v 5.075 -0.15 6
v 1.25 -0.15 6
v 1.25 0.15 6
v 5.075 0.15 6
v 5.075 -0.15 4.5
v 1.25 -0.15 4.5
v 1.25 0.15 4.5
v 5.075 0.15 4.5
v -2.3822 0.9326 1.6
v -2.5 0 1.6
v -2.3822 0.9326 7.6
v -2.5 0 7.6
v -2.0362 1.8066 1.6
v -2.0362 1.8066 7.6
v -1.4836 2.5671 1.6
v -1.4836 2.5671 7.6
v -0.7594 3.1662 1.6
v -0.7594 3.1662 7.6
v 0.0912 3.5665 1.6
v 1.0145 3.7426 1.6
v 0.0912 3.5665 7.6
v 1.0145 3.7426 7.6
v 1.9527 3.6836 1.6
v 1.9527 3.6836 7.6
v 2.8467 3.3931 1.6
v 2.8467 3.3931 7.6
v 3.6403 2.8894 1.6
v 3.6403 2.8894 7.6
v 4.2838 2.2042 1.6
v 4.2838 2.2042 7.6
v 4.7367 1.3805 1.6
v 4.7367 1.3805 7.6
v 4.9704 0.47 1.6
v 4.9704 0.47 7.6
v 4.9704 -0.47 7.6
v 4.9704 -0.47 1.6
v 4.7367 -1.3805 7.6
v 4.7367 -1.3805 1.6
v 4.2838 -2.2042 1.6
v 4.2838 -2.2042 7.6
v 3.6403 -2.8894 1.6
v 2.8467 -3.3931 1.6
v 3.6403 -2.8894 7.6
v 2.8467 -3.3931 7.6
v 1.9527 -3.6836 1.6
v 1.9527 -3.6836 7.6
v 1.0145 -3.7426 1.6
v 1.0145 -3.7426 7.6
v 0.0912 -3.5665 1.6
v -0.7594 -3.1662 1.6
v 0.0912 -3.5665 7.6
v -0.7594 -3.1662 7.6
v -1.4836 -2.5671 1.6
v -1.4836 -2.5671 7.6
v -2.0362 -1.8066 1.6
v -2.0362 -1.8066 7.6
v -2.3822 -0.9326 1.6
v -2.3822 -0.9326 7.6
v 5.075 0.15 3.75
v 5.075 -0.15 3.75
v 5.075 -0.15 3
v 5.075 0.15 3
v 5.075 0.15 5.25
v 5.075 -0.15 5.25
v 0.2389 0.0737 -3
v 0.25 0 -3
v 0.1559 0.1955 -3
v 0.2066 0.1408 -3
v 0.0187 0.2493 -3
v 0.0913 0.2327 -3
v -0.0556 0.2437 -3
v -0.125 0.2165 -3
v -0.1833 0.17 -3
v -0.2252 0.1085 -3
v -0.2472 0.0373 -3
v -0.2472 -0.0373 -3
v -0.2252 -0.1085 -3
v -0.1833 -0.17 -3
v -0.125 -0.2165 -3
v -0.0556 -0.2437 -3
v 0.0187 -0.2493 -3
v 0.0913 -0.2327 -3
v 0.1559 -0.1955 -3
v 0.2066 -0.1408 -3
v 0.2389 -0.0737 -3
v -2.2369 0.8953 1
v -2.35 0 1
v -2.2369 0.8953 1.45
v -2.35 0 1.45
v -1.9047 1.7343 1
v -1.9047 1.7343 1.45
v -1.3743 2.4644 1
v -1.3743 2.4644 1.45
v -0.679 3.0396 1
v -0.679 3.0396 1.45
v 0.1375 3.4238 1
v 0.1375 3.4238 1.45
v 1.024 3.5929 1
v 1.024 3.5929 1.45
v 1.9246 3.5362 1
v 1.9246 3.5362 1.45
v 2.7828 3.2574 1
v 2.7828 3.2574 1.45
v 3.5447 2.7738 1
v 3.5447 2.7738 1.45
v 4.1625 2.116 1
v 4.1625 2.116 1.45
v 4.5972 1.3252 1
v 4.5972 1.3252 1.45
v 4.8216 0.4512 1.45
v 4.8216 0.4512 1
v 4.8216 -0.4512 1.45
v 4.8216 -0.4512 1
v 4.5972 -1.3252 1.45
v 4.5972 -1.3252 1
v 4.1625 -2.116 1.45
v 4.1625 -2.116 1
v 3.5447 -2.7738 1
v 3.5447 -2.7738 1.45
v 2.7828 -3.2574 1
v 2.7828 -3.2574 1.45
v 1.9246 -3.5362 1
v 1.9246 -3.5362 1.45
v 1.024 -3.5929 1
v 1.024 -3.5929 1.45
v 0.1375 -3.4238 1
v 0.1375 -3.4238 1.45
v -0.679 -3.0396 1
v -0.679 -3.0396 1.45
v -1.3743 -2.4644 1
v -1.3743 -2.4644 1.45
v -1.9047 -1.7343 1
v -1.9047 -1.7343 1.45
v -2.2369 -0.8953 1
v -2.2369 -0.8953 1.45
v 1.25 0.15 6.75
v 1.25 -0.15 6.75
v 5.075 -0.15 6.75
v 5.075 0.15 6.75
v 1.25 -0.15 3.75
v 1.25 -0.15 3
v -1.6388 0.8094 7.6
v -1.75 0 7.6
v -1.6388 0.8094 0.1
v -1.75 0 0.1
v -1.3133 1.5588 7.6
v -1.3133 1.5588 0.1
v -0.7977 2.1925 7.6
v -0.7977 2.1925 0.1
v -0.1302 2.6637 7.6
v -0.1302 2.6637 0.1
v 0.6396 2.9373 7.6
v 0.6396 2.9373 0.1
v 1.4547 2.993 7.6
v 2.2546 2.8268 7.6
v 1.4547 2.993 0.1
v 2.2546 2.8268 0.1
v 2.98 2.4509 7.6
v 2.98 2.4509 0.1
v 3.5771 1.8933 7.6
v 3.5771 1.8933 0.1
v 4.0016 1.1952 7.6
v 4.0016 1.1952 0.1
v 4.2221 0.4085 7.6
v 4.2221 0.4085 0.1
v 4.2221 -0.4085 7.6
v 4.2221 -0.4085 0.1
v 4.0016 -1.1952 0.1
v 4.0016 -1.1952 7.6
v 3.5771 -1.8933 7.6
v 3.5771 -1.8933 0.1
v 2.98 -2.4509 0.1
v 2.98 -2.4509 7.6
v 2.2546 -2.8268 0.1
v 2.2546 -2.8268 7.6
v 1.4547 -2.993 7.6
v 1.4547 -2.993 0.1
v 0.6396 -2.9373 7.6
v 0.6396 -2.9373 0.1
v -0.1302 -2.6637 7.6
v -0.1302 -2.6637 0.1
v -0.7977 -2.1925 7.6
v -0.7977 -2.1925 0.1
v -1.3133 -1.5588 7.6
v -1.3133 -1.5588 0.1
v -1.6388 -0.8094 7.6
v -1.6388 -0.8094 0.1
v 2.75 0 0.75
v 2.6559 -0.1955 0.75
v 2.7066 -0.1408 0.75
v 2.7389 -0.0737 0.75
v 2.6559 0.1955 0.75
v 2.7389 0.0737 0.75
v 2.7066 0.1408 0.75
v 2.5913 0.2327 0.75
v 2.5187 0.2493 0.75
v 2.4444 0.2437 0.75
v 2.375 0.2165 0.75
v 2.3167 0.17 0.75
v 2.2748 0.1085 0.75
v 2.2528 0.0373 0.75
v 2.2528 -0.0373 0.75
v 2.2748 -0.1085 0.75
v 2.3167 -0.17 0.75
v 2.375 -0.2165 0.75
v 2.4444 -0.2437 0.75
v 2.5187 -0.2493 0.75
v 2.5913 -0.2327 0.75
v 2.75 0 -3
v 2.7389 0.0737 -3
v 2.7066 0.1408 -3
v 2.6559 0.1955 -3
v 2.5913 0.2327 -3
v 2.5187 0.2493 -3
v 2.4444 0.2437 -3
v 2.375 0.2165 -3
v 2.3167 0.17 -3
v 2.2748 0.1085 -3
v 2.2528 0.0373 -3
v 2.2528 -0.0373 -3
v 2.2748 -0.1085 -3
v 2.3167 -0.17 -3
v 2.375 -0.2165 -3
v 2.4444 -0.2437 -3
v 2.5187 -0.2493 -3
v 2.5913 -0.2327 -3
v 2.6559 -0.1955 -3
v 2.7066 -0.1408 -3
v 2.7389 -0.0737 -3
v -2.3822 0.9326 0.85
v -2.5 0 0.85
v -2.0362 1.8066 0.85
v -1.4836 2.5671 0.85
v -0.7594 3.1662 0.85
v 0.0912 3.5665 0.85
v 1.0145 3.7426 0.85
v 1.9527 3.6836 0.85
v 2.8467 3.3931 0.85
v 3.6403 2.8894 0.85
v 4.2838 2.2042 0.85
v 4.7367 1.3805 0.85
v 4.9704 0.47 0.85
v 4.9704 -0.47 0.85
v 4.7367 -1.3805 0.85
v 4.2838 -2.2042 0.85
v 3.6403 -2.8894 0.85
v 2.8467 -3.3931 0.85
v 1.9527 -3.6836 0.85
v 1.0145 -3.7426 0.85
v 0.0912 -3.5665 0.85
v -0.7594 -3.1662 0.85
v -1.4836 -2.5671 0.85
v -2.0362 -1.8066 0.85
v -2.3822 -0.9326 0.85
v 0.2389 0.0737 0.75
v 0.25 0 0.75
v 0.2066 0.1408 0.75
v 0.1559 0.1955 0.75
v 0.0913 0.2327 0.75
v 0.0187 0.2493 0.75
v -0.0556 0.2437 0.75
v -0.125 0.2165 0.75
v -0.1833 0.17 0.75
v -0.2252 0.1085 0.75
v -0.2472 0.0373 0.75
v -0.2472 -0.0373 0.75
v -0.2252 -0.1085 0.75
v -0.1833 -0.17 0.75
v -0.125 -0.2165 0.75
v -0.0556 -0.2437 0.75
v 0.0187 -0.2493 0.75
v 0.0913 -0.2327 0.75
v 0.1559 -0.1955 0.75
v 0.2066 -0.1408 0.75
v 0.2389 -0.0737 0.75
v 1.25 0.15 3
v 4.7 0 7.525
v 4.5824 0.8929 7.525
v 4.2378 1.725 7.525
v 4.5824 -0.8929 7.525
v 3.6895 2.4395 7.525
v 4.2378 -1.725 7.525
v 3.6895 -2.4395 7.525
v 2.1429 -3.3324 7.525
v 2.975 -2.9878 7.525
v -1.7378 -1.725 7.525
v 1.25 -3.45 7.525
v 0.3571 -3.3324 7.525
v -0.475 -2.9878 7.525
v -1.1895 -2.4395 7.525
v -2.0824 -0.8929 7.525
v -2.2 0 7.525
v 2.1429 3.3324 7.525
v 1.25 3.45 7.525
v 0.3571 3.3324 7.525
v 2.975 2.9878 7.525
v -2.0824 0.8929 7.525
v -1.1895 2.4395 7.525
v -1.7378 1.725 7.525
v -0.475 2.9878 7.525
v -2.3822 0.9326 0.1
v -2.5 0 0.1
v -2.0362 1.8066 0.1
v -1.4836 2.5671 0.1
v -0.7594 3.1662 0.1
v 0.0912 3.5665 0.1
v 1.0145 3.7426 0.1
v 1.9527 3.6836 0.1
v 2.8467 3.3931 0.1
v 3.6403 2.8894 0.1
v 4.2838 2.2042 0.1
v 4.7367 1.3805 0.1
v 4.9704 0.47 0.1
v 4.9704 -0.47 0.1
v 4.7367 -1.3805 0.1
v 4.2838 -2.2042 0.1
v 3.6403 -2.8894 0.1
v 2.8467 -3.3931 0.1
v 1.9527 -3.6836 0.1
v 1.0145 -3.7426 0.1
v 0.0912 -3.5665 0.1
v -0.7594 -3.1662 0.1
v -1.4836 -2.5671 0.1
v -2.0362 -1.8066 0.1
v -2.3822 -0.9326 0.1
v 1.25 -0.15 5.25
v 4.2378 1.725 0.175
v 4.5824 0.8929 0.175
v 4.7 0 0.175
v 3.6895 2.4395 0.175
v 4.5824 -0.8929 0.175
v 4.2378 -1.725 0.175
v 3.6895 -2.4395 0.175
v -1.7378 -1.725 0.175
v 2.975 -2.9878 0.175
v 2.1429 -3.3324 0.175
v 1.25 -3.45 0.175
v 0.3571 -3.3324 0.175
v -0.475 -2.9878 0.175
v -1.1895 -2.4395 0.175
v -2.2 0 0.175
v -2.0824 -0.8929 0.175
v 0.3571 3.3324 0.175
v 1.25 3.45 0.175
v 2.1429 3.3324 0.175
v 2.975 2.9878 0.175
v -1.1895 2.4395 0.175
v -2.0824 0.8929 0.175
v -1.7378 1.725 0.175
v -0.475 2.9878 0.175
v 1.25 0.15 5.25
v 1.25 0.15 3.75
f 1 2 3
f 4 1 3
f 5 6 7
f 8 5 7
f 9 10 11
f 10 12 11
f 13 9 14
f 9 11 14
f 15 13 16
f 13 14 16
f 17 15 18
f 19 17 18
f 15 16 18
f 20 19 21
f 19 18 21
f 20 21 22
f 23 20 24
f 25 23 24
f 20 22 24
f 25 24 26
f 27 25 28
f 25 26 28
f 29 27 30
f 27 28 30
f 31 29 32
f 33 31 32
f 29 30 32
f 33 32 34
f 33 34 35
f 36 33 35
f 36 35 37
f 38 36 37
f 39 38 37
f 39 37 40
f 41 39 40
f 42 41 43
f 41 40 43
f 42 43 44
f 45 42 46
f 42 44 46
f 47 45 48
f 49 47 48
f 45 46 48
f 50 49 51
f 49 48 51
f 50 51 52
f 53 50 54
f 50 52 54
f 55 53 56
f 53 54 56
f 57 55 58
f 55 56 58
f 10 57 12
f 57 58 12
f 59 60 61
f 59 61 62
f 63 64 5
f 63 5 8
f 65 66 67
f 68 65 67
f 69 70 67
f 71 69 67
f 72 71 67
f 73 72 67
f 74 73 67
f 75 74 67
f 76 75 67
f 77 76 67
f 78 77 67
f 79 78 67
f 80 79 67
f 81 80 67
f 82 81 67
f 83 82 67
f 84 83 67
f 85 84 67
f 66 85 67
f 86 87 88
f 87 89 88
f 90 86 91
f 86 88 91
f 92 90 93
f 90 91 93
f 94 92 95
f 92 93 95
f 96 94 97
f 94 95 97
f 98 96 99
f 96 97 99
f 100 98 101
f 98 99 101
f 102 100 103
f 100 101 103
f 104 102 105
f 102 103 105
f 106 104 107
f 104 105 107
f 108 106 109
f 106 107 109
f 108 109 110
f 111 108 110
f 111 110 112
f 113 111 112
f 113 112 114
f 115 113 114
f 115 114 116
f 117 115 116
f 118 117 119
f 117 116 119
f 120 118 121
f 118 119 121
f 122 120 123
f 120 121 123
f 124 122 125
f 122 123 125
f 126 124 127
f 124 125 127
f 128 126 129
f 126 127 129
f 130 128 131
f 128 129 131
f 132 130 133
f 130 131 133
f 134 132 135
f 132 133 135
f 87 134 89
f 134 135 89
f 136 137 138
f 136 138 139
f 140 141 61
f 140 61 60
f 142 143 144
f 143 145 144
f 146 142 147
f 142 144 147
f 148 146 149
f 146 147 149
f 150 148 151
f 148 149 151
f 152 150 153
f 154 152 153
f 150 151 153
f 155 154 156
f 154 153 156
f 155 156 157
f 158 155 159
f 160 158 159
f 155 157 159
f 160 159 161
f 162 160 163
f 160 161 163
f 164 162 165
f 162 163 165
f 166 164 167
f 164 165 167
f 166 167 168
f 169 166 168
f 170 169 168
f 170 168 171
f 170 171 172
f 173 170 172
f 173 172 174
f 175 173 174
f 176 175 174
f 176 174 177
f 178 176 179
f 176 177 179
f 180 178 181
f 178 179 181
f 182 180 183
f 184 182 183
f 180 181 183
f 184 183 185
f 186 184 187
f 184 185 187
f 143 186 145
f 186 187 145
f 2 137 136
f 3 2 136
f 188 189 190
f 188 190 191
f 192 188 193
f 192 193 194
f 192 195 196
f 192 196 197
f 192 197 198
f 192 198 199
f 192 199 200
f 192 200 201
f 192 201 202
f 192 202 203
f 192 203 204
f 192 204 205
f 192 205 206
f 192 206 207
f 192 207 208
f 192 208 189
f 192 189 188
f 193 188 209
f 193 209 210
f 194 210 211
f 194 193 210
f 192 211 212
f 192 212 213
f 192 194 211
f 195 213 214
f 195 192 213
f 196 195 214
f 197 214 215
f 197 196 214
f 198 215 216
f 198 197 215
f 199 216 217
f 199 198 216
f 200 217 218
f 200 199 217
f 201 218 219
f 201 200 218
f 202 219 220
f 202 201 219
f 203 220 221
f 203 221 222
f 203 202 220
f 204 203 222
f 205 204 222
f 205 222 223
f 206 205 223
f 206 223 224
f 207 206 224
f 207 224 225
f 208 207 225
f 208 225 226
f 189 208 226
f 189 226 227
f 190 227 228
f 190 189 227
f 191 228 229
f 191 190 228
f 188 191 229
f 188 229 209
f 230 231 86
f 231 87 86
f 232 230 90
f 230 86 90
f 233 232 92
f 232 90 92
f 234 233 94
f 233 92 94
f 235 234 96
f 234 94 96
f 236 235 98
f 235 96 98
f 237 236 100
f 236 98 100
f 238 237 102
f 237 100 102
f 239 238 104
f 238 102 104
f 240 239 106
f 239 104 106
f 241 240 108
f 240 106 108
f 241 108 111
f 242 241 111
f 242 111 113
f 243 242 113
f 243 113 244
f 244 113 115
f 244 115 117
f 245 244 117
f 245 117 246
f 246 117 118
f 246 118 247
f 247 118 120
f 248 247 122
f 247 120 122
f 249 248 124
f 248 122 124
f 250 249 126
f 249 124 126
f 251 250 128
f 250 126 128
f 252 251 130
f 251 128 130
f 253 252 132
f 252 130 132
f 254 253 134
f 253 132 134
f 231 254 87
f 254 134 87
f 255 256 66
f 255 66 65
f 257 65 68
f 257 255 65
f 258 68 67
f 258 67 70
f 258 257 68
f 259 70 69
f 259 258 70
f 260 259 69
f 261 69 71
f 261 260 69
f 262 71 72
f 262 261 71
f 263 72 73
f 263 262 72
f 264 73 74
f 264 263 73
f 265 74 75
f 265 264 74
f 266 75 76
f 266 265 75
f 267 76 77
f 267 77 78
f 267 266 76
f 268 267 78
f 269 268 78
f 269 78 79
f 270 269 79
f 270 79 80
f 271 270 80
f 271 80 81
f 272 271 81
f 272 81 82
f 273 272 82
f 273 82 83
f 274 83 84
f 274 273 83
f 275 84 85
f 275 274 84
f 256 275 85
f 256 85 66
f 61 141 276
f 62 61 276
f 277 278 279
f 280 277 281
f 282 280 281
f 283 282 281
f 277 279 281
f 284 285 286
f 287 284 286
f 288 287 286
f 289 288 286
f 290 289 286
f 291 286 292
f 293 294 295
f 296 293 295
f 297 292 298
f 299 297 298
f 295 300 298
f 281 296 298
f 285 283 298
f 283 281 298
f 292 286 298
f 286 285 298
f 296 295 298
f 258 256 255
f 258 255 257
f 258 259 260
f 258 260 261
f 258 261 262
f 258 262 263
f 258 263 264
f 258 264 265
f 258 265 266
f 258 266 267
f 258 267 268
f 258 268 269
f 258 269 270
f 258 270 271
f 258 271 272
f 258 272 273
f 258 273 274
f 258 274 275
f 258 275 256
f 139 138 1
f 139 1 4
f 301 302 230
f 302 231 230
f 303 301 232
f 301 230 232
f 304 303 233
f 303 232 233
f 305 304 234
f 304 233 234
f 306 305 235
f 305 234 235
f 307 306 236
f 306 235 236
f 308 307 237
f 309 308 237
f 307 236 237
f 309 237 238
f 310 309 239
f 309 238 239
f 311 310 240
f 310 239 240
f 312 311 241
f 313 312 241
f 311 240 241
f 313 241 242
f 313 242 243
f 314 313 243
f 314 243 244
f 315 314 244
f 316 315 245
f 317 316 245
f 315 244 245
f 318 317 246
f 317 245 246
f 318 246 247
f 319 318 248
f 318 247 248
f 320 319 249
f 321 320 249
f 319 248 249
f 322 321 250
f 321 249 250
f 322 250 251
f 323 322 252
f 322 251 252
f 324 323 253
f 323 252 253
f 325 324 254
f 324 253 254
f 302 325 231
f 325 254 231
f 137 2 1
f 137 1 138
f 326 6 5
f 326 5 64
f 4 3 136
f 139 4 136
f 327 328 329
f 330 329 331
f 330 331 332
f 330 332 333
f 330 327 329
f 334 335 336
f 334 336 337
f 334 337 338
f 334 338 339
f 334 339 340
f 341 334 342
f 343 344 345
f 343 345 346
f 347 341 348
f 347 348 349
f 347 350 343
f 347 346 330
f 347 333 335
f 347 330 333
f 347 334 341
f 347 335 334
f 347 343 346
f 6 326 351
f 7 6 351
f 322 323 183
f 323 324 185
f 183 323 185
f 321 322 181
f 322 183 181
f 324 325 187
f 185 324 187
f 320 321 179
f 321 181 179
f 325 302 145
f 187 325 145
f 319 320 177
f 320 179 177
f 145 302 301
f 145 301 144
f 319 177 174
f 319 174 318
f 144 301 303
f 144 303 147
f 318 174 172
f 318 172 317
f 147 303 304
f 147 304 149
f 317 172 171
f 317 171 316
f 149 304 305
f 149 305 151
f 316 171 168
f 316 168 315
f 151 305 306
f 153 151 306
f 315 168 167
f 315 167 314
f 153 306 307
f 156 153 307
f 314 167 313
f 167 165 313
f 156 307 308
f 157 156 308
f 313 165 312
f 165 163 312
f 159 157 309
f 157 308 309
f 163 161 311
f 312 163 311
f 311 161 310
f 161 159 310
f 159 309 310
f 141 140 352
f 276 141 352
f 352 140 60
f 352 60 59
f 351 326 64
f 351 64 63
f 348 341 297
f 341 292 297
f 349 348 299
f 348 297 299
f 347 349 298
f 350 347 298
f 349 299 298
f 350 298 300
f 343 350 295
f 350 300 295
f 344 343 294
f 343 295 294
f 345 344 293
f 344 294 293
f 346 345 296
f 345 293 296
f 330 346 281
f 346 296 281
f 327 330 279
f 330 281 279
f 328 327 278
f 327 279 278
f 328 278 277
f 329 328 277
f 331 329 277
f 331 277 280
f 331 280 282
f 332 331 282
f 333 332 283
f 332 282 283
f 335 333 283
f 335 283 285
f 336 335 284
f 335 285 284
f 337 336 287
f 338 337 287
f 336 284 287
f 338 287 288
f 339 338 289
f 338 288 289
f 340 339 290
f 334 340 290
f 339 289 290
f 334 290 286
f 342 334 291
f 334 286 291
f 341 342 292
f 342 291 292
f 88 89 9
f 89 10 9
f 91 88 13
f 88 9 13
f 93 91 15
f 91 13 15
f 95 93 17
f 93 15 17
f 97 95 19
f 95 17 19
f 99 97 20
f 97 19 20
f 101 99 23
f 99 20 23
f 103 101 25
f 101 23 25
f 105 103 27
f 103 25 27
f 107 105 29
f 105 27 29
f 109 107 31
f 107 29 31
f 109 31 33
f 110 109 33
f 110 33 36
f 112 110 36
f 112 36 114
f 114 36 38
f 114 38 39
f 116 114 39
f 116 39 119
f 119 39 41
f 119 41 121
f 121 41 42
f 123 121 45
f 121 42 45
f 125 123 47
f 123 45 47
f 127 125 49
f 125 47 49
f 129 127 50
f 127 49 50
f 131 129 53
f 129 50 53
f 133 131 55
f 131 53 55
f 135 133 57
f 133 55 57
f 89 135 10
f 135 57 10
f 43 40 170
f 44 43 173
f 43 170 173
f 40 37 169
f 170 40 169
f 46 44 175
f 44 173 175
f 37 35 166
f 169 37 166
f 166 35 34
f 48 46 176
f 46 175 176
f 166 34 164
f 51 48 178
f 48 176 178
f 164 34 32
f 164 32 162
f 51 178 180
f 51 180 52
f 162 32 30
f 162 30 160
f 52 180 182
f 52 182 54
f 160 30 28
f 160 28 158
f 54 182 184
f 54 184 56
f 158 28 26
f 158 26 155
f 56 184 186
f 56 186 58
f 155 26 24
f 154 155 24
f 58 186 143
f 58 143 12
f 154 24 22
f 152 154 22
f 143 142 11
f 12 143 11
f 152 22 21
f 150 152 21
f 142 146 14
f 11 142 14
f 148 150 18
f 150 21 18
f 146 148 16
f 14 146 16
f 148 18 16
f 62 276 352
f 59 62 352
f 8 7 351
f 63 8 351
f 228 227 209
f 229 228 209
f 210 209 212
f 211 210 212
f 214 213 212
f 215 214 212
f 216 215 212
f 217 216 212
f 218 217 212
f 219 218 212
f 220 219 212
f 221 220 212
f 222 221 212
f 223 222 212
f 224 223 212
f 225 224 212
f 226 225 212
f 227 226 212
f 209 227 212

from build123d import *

# Parameters (mm, degrees)
SKETCH002_W  = 3.45
SKETCH002_H  = 7.35
SKETCH003_R  = 0.25
PAD_DEPTH    = 3.75
SKETCH004_W  = 0.3
SKETCH004_H  = 0.75
PAD001_DEPTH = 3.825


with BuildPart() as revolution:
    # Sketch → Revolution (revolve)
    with BuildSketch(Plane.XZ):
        Polygon((-2.5, 0.1), (-2.5, 0.85), (-2.35, 1), (-2.35, 1.45), (-2.5, 1.6), (-2.5, 7.6), (-1.75, 7.6), (-1.75, 0.1), align=None)
    revolve(axis=Axis((1.25, 0, 7.548619), (0, 0, -1)))


with BuildPart() as revolution001:
    # Sketch002 → Revolution001 (revolve)
    with BuildSketch(Plane.XZ):
        with Locations((-0.475, 3.85)):
            Rectangle(SKETCH002_W, SKETCH002_H)
    revolve(axis=Axis((1.25, 0, 4.680116), (0, 0, -1)))


with BuildPart() as pad:
    # Sketch003 → Pad (new body)
    with BuildSketch(Plane.XY.offset(0.75)):
        Circle(SKETCH003_R)
        with Locations((2.5, 0)):
            Circle(SKETCH003_R)
    extrude(amount=-PAD_DEPTH)


with BuildPart() as pad001:
    # Sketch004 → Pad001 (new body)
    with BuildSketch(Plane.YZ.offset(1.25)):
        with Locations((0, 3.375)):
            Rectangle(SKETCH004_W, SKETCH004_H)
        with Locations((0, 4.875)):
            Rectangle(SKETCH004_W, SKETCH004_H)
        with Locations((0, 6.375)):
            Rectangle(SKETCH004_W, SKETCH004_H)
    extrude(amount=PAD001_DEPTH)


solid = Compound([revolution.part, revolution001.part, pad.part, pad001.part])
